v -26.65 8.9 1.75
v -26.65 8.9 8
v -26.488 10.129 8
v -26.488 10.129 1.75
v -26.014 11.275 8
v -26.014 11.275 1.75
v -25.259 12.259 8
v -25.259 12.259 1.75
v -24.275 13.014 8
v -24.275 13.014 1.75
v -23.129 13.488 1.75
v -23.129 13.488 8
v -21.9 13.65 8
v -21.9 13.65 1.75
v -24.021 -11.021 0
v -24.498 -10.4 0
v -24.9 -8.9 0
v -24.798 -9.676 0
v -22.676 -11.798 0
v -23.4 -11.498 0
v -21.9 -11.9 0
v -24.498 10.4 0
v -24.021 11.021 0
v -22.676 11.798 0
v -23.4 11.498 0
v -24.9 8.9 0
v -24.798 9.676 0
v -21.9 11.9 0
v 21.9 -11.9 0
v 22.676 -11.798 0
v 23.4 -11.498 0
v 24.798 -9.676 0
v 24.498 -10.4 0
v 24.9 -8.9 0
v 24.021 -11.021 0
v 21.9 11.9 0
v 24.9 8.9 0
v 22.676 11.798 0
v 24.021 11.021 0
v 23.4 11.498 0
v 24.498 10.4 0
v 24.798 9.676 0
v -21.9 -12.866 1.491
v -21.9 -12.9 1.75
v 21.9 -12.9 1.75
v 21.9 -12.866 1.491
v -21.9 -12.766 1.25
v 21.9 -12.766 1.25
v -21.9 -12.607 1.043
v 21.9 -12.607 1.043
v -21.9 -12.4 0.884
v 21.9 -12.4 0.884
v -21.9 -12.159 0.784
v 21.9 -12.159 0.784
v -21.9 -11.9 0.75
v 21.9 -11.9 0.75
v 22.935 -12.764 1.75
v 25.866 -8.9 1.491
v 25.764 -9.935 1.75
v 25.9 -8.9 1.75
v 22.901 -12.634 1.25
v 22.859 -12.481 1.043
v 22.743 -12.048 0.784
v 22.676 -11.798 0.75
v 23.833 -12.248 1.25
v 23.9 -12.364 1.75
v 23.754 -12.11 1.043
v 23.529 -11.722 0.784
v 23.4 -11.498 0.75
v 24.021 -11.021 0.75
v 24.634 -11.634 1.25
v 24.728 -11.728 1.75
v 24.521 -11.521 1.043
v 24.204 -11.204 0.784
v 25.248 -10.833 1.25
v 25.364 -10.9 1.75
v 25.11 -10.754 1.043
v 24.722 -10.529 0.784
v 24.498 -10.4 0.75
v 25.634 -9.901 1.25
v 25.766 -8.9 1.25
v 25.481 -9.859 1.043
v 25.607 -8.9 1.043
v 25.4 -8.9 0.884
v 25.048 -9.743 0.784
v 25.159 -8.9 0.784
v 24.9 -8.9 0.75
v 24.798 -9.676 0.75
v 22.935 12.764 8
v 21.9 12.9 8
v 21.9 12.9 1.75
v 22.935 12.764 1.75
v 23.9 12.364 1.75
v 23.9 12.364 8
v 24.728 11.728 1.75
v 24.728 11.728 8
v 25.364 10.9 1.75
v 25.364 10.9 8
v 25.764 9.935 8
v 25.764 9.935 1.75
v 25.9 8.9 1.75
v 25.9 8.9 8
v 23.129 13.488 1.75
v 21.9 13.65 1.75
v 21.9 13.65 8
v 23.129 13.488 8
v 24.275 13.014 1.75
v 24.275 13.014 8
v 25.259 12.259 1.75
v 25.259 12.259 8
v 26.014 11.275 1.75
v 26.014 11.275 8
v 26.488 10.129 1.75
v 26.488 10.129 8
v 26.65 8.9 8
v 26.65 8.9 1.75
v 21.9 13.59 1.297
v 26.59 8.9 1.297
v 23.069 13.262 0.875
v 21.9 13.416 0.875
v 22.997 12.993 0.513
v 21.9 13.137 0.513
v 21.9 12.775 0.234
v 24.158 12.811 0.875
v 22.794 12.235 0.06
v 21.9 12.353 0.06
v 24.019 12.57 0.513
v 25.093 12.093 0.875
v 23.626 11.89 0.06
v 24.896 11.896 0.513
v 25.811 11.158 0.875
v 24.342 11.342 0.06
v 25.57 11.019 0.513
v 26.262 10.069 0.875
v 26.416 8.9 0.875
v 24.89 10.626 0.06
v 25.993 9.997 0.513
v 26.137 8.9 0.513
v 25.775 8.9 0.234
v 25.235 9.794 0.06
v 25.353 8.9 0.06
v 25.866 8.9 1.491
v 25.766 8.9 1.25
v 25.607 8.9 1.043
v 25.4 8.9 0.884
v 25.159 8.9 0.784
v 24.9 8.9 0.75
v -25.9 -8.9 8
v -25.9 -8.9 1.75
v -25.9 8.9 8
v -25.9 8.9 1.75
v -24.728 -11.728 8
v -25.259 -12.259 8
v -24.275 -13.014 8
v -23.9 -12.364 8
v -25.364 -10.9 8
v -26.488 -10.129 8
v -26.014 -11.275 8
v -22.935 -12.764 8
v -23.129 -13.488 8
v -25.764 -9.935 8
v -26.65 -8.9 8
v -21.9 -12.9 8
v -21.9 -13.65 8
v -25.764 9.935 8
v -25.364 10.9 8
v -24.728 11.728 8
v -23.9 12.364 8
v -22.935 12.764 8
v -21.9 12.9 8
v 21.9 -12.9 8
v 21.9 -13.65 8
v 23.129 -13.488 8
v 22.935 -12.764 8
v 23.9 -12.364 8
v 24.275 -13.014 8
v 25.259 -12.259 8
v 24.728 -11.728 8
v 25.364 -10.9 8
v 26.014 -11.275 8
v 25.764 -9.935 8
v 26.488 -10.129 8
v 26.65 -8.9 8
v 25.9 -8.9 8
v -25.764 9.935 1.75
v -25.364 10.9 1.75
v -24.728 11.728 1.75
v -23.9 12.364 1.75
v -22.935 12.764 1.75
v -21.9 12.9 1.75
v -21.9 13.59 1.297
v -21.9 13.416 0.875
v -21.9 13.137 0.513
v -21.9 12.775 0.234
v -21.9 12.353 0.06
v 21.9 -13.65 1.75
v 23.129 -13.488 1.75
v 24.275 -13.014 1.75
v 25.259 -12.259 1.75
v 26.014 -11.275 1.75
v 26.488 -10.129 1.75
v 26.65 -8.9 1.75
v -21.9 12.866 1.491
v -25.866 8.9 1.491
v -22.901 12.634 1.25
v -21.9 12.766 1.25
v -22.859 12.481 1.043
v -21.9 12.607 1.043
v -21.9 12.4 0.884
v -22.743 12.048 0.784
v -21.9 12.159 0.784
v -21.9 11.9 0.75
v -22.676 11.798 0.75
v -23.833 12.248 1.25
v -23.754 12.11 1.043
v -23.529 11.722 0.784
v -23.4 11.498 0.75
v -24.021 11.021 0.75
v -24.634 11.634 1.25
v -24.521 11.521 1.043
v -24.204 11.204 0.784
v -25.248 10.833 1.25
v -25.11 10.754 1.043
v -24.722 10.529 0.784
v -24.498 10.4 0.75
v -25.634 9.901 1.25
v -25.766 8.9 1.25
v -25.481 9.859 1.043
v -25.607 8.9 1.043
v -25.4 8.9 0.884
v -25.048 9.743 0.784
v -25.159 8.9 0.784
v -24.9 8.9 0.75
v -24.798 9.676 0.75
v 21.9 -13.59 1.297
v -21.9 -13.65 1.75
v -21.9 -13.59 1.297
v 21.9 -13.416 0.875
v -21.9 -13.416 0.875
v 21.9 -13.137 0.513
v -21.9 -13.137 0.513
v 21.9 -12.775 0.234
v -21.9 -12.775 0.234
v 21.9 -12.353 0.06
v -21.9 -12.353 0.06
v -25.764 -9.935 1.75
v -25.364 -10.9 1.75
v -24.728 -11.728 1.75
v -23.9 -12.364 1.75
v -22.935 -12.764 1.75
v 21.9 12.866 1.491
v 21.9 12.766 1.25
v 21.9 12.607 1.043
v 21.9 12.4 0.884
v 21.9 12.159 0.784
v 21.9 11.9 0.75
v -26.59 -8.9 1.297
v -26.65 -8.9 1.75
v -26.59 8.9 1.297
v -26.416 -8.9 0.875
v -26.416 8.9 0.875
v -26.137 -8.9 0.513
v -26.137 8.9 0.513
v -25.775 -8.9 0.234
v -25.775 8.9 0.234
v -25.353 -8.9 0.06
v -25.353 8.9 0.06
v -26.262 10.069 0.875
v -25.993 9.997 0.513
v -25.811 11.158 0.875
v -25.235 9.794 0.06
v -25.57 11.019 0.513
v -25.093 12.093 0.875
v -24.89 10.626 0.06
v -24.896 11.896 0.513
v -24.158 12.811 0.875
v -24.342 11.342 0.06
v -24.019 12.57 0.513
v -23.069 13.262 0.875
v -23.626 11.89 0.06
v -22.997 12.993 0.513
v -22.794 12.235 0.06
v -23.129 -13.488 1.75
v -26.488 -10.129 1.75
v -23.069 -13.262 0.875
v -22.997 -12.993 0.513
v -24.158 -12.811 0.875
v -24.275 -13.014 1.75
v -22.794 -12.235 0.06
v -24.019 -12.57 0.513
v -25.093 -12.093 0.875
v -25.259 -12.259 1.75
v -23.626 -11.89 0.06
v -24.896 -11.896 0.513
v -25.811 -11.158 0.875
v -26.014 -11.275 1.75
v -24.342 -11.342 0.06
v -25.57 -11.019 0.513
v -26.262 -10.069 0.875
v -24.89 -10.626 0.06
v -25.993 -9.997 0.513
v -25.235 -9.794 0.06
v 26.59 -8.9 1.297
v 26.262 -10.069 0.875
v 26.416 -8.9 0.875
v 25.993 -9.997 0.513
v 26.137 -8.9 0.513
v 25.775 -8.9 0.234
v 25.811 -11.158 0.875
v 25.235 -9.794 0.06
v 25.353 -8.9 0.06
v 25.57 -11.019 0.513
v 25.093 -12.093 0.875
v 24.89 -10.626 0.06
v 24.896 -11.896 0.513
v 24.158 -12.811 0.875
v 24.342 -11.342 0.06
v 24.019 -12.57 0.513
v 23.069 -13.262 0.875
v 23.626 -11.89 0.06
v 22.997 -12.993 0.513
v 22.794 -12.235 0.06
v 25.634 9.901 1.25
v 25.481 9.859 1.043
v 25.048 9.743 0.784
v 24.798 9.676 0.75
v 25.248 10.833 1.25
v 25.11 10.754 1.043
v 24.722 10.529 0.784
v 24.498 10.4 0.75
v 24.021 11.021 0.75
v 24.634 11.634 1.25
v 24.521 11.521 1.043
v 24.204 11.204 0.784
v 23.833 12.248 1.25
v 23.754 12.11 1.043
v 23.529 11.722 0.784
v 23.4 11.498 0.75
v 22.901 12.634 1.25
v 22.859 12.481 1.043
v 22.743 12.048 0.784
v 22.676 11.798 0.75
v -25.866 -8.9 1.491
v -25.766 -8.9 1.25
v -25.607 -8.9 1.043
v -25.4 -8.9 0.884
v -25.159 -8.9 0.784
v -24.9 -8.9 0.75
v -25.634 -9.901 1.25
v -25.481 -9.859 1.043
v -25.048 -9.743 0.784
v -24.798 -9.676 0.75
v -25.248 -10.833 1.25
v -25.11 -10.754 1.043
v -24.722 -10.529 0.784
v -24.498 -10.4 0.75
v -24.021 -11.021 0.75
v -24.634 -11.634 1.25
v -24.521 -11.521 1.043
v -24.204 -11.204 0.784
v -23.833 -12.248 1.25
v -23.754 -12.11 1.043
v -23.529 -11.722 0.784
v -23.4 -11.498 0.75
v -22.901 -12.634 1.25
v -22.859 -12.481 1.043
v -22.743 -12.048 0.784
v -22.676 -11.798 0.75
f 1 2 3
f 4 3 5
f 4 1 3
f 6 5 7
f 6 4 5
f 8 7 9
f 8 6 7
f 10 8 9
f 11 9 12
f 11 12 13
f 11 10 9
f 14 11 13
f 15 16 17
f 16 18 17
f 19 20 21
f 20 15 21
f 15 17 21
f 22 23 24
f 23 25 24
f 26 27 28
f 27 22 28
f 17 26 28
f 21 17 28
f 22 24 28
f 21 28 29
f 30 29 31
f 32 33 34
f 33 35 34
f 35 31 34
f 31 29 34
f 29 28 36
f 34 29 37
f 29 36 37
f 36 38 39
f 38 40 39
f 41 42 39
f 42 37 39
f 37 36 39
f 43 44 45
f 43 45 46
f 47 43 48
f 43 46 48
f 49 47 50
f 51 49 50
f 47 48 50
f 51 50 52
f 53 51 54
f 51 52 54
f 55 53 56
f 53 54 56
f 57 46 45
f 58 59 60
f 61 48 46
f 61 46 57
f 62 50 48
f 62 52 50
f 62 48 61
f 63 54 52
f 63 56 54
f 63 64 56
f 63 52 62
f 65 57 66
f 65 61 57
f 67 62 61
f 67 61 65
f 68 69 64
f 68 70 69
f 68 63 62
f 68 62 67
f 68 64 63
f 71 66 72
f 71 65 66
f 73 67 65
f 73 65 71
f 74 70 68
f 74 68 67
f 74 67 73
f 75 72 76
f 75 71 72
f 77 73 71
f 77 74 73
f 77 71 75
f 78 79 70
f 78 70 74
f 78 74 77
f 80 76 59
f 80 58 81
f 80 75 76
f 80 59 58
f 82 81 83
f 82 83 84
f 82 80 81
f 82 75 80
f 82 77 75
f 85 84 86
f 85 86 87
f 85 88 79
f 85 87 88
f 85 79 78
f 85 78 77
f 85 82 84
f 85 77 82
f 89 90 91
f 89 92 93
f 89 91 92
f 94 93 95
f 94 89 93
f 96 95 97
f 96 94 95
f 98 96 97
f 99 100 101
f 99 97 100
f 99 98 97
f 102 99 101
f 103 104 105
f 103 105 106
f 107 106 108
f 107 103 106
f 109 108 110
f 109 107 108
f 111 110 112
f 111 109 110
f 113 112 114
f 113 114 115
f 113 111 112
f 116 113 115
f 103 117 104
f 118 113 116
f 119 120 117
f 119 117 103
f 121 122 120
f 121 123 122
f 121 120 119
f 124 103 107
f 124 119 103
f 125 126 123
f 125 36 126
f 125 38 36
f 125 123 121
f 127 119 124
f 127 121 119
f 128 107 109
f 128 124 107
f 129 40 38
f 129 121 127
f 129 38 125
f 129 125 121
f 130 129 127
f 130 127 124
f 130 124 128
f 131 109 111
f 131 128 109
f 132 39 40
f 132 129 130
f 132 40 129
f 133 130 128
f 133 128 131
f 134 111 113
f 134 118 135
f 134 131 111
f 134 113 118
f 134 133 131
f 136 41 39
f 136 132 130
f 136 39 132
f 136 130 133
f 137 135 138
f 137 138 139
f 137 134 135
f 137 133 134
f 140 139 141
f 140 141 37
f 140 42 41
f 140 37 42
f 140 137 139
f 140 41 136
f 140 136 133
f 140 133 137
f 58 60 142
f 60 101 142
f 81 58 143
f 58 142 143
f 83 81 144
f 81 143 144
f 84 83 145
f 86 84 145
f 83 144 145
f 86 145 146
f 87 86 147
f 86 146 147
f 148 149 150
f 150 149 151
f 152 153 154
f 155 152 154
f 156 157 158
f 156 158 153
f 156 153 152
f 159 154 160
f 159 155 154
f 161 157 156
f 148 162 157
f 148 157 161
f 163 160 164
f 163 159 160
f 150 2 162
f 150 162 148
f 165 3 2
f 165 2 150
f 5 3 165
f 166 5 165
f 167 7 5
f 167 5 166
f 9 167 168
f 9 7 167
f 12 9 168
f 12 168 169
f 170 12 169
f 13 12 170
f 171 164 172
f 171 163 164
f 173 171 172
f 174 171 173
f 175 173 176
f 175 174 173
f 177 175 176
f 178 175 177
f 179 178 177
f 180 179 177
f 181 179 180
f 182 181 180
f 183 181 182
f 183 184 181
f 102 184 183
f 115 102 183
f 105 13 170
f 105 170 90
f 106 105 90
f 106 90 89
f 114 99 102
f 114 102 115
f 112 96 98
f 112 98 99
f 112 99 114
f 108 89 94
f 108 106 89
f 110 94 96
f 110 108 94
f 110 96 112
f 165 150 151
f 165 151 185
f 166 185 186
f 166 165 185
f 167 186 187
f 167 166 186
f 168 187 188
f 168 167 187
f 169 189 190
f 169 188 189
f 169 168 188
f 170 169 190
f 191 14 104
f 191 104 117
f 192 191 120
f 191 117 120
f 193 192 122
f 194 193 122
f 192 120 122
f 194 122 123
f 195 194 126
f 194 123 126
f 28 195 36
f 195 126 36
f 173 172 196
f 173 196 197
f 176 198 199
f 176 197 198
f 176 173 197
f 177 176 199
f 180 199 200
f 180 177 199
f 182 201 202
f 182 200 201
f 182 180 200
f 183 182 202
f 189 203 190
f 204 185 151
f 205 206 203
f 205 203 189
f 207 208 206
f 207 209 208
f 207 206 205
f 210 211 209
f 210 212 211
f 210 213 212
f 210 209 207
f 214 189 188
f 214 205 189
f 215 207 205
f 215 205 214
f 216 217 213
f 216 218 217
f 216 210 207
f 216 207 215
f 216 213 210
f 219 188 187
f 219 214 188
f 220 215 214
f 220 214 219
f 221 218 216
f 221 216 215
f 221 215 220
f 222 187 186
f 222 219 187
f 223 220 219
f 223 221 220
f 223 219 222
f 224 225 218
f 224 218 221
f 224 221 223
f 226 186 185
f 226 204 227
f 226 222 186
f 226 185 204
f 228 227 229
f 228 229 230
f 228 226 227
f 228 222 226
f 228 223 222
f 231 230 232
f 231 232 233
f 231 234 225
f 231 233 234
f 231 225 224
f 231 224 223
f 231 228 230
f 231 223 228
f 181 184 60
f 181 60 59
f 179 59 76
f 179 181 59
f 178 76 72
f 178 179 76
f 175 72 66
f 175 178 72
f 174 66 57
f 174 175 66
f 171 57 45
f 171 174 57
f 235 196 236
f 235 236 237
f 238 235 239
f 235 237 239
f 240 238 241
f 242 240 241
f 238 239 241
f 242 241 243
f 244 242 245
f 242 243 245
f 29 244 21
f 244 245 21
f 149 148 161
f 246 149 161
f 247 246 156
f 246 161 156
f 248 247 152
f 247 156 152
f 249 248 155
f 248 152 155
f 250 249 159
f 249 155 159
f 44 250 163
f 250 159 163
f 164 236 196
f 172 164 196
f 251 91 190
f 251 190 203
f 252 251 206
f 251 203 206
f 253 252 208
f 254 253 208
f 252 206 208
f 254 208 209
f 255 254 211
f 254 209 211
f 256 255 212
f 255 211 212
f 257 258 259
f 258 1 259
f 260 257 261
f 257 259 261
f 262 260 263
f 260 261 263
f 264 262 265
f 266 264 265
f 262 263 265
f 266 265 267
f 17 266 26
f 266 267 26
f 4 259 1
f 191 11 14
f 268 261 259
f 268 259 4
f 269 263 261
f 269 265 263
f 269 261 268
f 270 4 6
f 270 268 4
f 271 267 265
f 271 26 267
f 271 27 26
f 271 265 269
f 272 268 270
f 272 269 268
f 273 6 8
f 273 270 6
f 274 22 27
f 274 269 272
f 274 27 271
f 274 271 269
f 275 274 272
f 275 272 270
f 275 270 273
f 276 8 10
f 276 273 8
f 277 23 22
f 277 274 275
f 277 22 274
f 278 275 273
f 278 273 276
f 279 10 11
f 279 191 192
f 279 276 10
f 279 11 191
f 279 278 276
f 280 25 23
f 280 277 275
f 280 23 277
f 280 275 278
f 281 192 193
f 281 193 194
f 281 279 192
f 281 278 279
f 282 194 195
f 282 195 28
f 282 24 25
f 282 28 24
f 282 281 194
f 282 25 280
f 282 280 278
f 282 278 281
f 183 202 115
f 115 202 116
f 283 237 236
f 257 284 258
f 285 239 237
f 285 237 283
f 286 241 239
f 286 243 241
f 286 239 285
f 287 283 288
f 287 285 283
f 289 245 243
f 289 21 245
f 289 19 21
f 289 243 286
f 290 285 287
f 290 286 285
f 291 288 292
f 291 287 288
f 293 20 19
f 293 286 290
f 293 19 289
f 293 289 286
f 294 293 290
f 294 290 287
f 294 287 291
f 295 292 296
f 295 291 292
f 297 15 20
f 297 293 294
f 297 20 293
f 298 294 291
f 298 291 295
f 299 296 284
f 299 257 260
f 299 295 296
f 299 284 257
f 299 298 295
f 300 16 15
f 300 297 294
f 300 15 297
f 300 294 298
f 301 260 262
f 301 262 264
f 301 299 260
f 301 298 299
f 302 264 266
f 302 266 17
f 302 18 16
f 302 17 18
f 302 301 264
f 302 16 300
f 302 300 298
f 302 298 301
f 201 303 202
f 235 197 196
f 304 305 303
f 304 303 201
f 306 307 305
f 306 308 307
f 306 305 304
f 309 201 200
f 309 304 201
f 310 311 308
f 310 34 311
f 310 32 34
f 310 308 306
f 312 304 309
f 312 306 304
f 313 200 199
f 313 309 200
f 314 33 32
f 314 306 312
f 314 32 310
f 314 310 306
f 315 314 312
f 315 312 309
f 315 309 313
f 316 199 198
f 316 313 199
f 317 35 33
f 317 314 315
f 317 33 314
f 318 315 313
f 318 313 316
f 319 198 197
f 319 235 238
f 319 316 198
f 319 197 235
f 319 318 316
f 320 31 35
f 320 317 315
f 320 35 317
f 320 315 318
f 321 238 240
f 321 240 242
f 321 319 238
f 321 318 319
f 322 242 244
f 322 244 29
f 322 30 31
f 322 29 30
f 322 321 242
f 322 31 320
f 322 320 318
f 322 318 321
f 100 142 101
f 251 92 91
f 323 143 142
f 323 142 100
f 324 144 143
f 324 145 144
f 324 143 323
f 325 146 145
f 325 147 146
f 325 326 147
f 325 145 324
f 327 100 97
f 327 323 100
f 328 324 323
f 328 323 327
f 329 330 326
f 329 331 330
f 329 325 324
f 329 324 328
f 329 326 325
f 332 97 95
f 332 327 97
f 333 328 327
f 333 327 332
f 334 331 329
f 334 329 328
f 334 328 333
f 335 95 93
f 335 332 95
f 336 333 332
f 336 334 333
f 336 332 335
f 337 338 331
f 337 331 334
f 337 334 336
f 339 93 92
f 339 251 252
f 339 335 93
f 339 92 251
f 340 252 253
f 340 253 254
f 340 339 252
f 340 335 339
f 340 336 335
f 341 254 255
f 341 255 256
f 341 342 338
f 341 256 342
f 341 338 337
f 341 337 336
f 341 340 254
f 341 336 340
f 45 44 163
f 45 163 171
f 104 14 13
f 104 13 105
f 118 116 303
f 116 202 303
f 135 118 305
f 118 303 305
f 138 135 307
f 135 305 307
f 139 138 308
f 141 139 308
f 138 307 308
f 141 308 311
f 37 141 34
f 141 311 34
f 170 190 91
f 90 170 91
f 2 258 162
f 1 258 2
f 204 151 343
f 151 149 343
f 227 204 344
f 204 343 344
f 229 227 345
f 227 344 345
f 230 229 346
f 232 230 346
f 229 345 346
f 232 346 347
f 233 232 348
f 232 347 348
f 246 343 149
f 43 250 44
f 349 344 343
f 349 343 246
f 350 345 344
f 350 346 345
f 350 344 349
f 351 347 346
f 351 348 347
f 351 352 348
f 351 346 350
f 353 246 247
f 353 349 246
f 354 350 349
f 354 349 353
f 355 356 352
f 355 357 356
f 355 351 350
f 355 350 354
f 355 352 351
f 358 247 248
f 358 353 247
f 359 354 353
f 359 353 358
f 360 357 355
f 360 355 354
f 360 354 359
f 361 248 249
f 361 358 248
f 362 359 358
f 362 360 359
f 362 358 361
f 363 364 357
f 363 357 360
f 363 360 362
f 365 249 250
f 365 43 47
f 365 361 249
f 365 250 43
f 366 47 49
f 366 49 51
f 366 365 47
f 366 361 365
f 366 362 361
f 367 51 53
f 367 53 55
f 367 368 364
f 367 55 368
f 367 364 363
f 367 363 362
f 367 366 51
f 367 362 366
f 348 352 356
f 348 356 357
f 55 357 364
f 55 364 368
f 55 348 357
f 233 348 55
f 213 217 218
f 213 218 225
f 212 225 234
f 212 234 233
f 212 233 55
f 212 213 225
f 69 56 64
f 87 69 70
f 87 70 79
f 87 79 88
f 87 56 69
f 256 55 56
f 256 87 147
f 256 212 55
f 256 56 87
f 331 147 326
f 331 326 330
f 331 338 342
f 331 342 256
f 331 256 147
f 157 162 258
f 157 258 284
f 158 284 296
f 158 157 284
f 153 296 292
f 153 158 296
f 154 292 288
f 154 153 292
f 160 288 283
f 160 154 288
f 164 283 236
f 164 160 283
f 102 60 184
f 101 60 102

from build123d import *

# Parameters (mm, degrees)
F0_W     = 53.3
F0_H     = 27.3
F0_W_2   = 51.8
F0_H_2   = 25.8
F1_DEPTH = 0.75
F2_DEPTH = 8
F3_R     = 4
F4_R     = 4.75
F5_R     = 1
F6_R     = 1.75


with BuildPart() as f1:
    # F0 (on Top) → F1 (new body)
    with BuildSketch(Plane.XY):
        Rectangle(F0_W, F0_H)
        Rectangle(F0_W_2, F0_H_2, mode=Mode.SUBTRACT)
        Rectangle(F0_W_2, F0_H_2)
    extrude(amount=F1_DEPTH)

    # F0 (on Top) → F2 (join)
    with BuildSketch(Plane.XY):
        Rectangle(F0_W, F0_H)
        Rectangle(F0_W_2, F0_H_2, mode=Mode.SUBTRACT)
    extrude(amount=F2_DEPTH)

    # F3
    f3_edges = [f1.edges().sort_by_distance(p)[0] for p in [
        (-25.9, 12.9, 4.375),
        (25.9, 12.9, 4.375),
        (25.9, -12.9, 4.375),
        (-25.9, -12.9, 4.375),
    ]]
    fillet(f3_edges, radius=F3_R)

    # F4
    f4_edges = [f1.edges().sort_by_distance(p)[0] for p in [
        (26.65, 13.65, 4),
        (26.65, -13.65, 4),
        (-26.65, 13.65, 4),
        (-26.65, -13.65, 4),
    ]]
    fillet(f4_edges, radius=F4_R)

    # F5
    f5_edges = [f1.edges().sort_by_distance(p)[0] for p in [
        (0, 12.9, 0.75),
    ]]
    fillet(f5_edges, radius=F5_R)

    # F6
    f6_edges = [f1.edges().sort_by_distance(p)[0] for p in [
        (0, 13.65, 0),
    ]]
    fillet(f6_edges, radius=F6_R)


solid = f1.part
